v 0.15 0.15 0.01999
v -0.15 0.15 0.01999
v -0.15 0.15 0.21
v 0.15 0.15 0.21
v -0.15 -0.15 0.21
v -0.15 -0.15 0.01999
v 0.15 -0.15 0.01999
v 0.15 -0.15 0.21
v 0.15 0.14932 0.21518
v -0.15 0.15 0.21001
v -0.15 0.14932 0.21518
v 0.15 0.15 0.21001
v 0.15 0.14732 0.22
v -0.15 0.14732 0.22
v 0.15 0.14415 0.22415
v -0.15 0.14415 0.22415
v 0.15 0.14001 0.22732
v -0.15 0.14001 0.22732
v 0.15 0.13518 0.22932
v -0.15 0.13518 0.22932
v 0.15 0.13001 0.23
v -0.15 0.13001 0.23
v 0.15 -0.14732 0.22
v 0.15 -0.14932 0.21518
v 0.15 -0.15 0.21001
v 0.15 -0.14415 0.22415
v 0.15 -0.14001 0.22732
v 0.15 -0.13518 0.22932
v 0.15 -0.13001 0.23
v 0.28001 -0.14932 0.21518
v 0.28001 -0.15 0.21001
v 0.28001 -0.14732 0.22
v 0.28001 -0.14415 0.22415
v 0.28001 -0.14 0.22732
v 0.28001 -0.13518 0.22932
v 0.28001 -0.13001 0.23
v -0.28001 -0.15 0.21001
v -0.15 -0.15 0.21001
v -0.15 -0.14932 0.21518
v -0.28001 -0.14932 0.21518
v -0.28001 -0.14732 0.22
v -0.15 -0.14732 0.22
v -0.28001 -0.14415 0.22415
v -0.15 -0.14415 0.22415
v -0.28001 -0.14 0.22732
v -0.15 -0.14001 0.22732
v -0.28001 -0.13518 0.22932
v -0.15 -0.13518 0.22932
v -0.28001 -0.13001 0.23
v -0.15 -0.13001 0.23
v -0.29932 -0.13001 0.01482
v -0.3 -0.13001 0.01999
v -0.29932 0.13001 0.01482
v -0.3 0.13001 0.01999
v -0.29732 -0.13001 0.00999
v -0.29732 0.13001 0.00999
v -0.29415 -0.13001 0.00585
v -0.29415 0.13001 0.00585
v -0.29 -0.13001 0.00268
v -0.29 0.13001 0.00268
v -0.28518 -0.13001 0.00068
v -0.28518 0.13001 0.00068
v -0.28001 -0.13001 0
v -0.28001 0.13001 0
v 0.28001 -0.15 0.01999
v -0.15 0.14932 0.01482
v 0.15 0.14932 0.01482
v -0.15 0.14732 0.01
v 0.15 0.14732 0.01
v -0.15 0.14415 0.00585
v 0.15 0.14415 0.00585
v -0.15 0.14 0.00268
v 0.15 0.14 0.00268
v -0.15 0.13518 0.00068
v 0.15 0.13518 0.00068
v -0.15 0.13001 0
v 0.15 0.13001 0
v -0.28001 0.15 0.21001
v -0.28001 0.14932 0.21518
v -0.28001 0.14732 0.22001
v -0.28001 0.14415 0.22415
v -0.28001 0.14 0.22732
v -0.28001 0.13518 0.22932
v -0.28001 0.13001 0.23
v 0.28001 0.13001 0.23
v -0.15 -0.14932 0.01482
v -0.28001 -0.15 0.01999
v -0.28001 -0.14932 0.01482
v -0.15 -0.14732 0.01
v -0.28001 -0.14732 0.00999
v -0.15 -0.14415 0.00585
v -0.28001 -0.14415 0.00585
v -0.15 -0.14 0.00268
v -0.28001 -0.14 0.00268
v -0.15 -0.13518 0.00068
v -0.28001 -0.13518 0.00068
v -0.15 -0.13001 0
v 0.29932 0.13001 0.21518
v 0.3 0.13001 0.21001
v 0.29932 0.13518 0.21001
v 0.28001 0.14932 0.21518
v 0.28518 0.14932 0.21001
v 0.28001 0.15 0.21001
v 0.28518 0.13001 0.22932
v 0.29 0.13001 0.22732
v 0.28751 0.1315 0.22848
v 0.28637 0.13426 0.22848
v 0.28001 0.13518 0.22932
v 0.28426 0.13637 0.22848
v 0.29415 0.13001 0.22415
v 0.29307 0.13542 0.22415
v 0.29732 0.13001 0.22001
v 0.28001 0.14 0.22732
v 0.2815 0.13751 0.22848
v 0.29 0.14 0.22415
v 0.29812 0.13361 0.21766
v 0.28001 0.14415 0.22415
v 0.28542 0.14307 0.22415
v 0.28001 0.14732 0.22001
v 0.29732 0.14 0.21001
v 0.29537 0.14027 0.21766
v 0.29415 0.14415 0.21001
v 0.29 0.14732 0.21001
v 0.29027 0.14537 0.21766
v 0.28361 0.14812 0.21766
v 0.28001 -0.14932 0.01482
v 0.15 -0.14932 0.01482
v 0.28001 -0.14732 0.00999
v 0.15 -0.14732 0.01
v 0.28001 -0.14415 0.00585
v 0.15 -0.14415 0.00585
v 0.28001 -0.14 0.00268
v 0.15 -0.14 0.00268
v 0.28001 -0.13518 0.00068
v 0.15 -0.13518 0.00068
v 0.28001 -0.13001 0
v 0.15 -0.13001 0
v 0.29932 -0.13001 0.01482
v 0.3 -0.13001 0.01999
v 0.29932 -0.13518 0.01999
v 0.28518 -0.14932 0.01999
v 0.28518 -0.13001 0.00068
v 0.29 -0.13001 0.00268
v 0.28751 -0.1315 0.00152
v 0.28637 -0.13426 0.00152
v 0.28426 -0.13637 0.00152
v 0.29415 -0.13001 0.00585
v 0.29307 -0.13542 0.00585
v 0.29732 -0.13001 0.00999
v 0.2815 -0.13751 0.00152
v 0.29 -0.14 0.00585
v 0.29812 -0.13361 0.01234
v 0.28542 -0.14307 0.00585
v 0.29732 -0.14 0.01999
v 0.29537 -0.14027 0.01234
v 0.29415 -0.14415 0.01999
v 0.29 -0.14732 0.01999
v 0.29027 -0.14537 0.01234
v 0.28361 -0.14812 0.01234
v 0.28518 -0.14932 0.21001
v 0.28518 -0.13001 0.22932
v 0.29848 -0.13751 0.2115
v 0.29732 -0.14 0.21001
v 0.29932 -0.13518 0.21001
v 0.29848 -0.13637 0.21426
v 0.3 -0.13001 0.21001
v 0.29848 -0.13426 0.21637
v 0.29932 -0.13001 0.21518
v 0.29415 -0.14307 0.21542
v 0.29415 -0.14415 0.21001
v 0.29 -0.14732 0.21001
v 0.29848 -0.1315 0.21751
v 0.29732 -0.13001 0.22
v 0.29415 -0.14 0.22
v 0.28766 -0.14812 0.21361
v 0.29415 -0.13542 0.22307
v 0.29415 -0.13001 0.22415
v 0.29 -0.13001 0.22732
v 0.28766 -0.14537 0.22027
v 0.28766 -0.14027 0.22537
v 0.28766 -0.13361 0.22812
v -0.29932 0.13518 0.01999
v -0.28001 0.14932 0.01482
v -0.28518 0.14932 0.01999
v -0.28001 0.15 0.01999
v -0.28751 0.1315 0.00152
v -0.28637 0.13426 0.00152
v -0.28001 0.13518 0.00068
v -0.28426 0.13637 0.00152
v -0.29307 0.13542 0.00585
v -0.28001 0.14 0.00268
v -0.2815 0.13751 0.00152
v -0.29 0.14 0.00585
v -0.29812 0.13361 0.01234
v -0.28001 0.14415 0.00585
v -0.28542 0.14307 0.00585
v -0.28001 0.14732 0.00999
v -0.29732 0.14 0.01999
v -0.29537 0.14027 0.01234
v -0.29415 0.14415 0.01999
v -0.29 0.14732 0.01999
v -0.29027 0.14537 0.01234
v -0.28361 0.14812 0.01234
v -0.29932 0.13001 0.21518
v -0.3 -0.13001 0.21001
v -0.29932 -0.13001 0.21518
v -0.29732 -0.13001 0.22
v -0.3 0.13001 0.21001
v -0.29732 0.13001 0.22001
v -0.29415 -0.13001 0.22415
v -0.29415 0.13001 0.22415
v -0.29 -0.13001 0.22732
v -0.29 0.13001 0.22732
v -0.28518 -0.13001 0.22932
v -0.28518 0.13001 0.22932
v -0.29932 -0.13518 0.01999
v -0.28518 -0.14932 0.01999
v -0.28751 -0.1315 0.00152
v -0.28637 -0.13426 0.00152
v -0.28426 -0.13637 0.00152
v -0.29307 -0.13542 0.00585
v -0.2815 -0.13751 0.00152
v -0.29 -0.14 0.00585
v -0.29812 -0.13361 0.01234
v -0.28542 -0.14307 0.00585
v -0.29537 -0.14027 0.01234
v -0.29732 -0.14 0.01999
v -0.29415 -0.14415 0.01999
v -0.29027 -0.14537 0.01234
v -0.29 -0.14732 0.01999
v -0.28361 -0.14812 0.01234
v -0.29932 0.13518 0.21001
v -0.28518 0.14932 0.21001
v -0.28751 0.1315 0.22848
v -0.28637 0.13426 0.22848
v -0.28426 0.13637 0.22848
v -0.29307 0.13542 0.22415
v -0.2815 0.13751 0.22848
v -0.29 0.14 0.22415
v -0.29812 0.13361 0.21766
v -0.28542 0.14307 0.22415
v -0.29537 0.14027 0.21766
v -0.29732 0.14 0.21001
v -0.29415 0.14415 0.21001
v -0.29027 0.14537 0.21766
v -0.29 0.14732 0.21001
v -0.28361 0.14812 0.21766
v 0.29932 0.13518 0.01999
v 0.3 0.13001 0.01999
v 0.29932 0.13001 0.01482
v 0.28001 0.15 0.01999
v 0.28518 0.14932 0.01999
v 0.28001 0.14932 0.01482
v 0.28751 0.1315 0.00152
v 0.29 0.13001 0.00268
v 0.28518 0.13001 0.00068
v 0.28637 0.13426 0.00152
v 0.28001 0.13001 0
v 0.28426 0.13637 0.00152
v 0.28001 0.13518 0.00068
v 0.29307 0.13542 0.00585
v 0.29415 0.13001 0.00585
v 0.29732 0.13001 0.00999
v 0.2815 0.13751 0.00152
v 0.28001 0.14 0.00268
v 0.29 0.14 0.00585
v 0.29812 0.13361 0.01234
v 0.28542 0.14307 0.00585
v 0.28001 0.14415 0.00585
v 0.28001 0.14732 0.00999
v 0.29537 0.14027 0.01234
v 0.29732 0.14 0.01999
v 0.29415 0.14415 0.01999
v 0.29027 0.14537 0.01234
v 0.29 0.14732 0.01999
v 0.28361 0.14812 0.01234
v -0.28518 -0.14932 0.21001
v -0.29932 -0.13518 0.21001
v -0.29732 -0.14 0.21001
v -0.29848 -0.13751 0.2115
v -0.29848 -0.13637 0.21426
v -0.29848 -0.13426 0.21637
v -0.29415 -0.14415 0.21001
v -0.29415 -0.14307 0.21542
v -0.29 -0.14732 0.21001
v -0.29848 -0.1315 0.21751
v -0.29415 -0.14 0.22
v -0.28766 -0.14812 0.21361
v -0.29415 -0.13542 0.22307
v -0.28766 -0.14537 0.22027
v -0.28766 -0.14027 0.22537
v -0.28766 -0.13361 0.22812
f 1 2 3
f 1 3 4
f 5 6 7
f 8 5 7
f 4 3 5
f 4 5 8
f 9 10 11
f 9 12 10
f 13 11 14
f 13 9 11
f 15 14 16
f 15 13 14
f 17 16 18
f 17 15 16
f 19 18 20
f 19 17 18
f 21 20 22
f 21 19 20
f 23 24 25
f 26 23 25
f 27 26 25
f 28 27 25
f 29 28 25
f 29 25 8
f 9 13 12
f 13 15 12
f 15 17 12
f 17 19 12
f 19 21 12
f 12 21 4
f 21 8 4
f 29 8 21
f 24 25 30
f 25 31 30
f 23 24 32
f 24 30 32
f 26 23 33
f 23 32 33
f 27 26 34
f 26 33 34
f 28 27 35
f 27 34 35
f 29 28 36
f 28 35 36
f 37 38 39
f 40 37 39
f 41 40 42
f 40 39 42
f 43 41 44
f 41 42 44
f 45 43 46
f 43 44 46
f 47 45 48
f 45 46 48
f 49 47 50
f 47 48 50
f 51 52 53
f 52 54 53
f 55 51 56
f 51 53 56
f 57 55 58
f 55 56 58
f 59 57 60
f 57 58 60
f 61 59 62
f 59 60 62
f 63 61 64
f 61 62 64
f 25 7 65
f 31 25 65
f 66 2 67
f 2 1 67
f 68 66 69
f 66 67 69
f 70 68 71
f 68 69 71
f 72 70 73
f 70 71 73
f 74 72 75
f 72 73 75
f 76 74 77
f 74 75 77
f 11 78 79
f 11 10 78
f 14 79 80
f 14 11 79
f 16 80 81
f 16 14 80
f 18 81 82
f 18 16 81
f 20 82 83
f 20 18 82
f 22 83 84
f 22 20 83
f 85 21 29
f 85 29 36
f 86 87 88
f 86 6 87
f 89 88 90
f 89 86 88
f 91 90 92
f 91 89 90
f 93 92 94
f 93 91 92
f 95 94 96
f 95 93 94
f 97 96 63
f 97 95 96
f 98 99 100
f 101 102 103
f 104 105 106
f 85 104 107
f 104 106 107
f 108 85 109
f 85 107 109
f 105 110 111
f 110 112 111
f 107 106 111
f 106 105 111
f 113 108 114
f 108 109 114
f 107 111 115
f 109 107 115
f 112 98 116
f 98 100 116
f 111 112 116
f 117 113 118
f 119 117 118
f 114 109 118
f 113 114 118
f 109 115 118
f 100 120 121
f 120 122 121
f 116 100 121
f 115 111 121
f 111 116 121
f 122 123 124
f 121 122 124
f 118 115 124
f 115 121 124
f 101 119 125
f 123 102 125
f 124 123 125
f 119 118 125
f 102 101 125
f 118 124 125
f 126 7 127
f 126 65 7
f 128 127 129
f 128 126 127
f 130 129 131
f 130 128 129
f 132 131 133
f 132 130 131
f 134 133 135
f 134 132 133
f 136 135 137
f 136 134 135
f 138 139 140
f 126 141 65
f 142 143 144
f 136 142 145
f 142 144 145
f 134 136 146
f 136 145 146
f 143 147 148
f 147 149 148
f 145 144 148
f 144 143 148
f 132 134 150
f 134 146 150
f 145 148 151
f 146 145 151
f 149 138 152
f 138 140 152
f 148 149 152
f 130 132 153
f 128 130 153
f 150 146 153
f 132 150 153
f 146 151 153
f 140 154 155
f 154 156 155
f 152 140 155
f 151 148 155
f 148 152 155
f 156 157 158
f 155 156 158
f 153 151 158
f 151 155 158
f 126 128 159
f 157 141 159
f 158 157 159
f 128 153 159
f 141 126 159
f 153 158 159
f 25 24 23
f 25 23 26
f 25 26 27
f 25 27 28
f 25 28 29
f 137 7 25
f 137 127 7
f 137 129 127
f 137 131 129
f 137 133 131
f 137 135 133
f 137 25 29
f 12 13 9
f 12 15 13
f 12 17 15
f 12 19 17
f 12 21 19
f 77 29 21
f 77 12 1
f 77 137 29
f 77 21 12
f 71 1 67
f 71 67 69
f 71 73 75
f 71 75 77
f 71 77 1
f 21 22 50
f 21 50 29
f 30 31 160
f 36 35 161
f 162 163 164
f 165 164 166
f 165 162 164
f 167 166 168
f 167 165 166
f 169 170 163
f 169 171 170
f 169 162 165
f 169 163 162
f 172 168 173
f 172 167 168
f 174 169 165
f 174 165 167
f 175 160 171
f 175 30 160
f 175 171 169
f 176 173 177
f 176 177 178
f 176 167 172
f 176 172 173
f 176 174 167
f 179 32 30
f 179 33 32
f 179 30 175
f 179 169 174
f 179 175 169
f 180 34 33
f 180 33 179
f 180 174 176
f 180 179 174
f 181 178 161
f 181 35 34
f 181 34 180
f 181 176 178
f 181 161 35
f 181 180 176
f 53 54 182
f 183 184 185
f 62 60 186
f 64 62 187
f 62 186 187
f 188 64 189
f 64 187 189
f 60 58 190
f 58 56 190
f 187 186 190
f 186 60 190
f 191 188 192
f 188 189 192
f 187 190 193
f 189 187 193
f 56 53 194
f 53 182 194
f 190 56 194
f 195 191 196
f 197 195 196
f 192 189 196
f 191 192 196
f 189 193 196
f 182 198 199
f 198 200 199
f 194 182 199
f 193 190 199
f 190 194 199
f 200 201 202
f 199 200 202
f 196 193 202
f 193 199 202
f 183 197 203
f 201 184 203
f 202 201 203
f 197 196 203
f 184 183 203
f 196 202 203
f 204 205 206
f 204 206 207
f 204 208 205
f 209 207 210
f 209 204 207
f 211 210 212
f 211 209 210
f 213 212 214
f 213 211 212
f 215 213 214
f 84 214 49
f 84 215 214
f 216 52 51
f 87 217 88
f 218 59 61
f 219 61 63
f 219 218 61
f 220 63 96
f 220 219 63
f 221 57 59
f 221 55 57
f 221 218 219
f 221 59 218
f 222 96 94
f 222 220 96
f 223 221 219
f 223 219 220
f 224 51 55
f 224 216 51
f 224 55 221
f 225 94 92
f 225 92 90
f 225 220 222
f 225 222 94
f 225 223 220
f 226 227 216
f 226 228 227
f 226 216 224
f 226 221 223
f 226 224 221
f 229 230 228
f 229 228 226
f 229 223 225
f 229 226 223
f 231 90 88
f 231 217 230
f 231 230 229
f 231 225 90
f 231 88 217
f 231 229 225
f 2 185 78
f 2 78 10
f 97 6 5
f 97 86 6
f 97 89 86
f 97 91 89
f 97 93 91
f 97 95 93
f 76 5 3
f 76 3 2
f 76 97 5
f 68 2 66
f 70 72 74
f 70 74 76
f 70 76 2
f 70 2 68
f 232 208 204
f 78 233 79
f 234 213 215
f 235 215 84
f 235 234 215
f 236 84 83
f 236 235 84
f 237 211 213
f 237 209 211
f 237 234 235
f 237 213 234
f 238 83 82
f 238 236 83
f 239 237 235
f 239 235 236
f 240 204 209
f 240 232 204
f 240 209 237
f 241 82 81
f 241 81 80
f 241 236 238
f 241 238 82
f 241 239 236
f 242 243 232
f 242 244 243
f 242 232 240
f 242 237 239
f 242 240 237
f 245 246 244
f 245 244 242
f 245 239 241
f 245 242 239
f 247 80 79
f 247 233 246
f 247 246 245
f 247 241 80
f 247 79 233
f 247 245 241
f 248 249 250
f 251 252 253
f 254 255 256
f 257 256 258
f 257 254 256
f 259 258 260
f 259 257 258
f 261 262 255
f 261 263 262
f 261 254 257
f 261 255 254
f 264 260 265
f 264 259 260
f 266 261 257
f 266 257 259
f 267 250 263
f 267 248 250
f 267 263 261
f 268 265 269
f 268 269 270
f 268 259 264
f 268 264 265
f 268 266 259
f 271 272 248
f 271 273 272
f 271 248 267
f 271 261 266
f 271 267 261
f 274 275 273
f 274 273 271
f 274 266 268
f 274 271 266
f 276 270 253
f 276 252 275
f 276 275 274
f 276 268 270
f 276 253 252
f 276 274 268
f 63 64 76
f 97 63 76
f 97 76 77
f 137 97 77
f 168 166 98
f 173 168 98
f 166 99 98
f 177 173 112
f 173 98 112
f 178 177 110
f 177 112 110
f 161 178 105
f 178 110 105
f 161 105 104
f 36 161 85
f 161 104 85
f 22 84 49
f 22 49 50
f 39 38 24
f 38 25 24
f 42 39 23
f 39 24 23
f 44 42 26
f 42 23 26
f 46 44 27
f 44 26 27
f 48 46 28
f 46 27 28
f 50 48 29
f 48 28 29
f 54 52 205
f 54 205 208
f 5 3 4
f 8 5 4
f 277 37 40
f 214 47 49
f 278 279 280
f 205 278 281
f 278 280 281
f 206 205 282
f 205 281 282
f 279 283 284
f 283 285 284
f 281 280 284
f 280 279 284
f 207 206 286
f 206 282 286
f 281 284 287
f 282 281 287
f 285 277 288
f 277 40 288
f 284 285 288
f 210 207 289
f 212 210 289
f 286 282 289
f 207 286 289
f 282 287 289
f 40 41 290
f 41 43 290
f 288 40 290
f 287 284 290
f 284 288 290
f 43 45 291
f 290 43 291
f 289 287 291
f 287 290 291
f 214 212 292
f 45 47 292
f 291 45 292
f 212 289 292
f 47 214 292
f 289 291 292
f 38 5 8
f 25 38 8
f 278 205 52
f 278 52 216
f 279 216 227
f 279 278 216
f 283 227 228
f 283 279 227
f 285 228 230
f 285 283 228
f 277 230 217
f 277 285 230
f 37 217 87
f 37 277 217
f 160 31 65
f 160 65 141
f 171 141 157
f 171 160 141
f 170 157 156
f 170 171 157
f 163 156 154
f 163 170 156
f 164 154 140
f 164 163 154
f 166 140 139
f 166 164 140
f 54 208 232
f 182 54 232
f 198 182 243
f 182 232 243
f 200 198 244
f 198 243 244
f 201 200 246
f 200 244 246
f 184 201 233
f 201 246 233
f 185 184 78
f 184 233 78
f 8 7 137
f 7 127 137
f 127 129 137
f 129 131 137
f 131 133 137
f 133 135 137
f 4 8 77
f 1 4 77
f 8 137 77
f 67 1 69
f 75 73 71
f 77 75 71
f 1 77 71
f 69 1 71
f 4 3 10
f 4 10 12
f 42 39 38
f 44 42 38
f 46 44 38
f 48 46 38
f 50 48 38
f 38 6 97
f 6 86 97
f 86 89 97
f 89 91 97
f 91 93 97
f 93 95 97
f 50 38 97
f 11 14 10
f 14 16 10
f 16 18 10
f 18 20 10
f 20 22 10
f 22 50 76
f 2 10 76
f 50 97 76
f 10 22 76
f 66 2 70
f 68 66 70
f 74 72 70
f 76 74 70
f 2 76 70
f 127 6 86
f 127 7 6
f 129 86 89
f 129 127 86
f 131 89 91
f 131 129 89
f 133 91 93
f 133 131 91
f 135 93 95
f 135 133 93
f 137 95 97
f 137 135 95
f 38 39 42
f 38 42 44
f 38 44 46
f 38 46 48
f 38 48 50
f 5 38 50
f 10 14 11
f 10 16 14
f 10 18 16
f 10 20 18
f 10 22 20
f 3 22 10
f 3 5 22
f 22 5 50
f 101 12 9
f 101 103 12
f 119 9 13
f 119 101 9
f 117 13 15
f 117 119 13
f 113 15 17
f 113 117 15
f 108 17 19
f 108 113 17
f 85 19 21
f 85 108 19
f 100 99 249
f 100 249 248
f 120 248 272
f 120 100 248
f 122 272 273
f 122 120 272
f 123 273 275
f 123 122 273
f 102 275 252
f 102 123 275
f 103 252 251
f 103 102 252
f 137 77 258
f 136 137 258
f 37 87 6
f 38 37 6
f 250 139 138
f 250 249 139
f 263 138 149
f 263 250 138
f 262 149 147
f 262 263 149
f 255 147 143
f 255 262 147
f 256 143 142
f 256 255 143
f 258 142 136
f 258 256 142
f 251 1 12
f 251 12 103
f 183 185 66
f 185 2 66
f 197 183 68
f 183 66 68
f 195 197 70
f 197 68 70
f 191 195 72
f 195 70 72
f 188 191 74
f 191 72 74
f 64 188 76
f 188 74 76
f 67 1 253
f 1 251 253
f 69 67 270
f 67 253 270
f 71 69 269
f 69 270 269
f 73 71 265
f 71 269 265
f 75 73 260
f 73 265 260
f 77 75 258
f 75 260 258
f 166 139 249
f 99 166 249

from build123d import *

# Parameters (mm, degrees)
F2_W     = 0.3
F2_H     = 0.3
F3_DEPTH = 0.21
F2_W_2   = 0.15
F4_DEPTH = 0.23
F5_DEPTH = 0.23
F6_DEPTH = 0.02
F7_R     = 0.01999
F7_2_R   = 0.01999
F7_3_R   = 0.01999
F7_4_R   = 0.01999


# Not quite as in the source:
# - a fillet or chamfer is up to 0.001 mm smaller than in the source, because OpenCascade refuses the exact size


with BuildPart() as f3:
    # F2 (on Top) → F3 (new body)
    with BuildSketch(Plane.XY):
        Rectangle(F2_W, F2_H)
    extrude(amount=F3_DEPTH)


with BuildPart() as f4:
    # F2 (on Top) → F4 (new body)
    with BuildSketch(Plane.XY):
        with Locations((-0.225, 0)):
            Rectangle(F2_W_2, F2_H)
    extrude(amount=F4_DEPTH)

    # F7 (radius 0.02 in the source; OpenCascade refuses exactly that, so slightly less here)
    f7_edges = [f4.edges().sort_by_distance(p)[0] for p in [
        (-0.225, -0.15, 0.23),
        (-0.3, 0.15, 0.115),
        (-0.3, -0.15, 0.115),
        (-0.3, 0, 0),
        (-0.3, 0, 0.23),
        (-0.225, 0.15, 0.23),
        (-0.225, 0.15, 0),
        (-0.225, -0.15, 0),
    ]]
    fillet(f7_edges, radius=F7_R)


with BuildPart() as f5:
    # F2 (on Top) → F5 (new body)
    with BuildSketch(Plane.XY):
        with Locations((0.225, 0)):
            Rectangle(F2_W_2, F2_H)
    extrude(amount=F5_DEPTH)

    # F7#2 (radius 0.02 in the source; OpenCascade refuses exactly that, so slightly less here)
    f7_2_edges = [f5.edges().sort_by_distance(p)[0] for p in [
        (0.225, -0.15, 0.23),
        (0.3, -0.15, 0.115),
        (0.3, 0.15, 0.115),
        (0.3, 0, 0),
        (0.3, 0, 0.23),
        (0.225, 0.15, 0.23),
        (0.225, 0.15, 0),
        (0.225, -0.15, 0),
    ]]
    fillet(f7_2_edges, radius=F7_2_R)


with BuildPart() as f6:
    # F6 (new): a face of the model
    f6_faces = [f3.part.faces().sort_by_distance(p)[0] for p in [
        (0, 0, 0.21),
    ]]
    extrude(f6_faces, amount=F6_DEPTH)

    # F7#4 (radius 0.02 in the source; OpenCascade refuses exactly that, so slightly less here)
    f7_4_edges = [f6.edges().sort_by_distance(p)[0] for p in [
        (0, -0.15, 0.23),
        (0, 0.15, 0.23),
    ]]
    fillet(f7_4_edges, radius=F7_4_R)


with BuildPart() as f3_1:
    add(f3.part)

    # F7#3 (radius 0.02 in the source; OpenCascade refuses exactly that, so slightly less here)
    f7_3_edges = [f3_1.edges().sort_by_distance(p)[0] for p in [
        (0, 0.15, 0),
        (0, -0.15, 0),
    ]]
    fillet(f7_3_edges, radius=F7_3_R)


solid = Compound([f4.part, f5.part, f6.part, f3_1.part])
